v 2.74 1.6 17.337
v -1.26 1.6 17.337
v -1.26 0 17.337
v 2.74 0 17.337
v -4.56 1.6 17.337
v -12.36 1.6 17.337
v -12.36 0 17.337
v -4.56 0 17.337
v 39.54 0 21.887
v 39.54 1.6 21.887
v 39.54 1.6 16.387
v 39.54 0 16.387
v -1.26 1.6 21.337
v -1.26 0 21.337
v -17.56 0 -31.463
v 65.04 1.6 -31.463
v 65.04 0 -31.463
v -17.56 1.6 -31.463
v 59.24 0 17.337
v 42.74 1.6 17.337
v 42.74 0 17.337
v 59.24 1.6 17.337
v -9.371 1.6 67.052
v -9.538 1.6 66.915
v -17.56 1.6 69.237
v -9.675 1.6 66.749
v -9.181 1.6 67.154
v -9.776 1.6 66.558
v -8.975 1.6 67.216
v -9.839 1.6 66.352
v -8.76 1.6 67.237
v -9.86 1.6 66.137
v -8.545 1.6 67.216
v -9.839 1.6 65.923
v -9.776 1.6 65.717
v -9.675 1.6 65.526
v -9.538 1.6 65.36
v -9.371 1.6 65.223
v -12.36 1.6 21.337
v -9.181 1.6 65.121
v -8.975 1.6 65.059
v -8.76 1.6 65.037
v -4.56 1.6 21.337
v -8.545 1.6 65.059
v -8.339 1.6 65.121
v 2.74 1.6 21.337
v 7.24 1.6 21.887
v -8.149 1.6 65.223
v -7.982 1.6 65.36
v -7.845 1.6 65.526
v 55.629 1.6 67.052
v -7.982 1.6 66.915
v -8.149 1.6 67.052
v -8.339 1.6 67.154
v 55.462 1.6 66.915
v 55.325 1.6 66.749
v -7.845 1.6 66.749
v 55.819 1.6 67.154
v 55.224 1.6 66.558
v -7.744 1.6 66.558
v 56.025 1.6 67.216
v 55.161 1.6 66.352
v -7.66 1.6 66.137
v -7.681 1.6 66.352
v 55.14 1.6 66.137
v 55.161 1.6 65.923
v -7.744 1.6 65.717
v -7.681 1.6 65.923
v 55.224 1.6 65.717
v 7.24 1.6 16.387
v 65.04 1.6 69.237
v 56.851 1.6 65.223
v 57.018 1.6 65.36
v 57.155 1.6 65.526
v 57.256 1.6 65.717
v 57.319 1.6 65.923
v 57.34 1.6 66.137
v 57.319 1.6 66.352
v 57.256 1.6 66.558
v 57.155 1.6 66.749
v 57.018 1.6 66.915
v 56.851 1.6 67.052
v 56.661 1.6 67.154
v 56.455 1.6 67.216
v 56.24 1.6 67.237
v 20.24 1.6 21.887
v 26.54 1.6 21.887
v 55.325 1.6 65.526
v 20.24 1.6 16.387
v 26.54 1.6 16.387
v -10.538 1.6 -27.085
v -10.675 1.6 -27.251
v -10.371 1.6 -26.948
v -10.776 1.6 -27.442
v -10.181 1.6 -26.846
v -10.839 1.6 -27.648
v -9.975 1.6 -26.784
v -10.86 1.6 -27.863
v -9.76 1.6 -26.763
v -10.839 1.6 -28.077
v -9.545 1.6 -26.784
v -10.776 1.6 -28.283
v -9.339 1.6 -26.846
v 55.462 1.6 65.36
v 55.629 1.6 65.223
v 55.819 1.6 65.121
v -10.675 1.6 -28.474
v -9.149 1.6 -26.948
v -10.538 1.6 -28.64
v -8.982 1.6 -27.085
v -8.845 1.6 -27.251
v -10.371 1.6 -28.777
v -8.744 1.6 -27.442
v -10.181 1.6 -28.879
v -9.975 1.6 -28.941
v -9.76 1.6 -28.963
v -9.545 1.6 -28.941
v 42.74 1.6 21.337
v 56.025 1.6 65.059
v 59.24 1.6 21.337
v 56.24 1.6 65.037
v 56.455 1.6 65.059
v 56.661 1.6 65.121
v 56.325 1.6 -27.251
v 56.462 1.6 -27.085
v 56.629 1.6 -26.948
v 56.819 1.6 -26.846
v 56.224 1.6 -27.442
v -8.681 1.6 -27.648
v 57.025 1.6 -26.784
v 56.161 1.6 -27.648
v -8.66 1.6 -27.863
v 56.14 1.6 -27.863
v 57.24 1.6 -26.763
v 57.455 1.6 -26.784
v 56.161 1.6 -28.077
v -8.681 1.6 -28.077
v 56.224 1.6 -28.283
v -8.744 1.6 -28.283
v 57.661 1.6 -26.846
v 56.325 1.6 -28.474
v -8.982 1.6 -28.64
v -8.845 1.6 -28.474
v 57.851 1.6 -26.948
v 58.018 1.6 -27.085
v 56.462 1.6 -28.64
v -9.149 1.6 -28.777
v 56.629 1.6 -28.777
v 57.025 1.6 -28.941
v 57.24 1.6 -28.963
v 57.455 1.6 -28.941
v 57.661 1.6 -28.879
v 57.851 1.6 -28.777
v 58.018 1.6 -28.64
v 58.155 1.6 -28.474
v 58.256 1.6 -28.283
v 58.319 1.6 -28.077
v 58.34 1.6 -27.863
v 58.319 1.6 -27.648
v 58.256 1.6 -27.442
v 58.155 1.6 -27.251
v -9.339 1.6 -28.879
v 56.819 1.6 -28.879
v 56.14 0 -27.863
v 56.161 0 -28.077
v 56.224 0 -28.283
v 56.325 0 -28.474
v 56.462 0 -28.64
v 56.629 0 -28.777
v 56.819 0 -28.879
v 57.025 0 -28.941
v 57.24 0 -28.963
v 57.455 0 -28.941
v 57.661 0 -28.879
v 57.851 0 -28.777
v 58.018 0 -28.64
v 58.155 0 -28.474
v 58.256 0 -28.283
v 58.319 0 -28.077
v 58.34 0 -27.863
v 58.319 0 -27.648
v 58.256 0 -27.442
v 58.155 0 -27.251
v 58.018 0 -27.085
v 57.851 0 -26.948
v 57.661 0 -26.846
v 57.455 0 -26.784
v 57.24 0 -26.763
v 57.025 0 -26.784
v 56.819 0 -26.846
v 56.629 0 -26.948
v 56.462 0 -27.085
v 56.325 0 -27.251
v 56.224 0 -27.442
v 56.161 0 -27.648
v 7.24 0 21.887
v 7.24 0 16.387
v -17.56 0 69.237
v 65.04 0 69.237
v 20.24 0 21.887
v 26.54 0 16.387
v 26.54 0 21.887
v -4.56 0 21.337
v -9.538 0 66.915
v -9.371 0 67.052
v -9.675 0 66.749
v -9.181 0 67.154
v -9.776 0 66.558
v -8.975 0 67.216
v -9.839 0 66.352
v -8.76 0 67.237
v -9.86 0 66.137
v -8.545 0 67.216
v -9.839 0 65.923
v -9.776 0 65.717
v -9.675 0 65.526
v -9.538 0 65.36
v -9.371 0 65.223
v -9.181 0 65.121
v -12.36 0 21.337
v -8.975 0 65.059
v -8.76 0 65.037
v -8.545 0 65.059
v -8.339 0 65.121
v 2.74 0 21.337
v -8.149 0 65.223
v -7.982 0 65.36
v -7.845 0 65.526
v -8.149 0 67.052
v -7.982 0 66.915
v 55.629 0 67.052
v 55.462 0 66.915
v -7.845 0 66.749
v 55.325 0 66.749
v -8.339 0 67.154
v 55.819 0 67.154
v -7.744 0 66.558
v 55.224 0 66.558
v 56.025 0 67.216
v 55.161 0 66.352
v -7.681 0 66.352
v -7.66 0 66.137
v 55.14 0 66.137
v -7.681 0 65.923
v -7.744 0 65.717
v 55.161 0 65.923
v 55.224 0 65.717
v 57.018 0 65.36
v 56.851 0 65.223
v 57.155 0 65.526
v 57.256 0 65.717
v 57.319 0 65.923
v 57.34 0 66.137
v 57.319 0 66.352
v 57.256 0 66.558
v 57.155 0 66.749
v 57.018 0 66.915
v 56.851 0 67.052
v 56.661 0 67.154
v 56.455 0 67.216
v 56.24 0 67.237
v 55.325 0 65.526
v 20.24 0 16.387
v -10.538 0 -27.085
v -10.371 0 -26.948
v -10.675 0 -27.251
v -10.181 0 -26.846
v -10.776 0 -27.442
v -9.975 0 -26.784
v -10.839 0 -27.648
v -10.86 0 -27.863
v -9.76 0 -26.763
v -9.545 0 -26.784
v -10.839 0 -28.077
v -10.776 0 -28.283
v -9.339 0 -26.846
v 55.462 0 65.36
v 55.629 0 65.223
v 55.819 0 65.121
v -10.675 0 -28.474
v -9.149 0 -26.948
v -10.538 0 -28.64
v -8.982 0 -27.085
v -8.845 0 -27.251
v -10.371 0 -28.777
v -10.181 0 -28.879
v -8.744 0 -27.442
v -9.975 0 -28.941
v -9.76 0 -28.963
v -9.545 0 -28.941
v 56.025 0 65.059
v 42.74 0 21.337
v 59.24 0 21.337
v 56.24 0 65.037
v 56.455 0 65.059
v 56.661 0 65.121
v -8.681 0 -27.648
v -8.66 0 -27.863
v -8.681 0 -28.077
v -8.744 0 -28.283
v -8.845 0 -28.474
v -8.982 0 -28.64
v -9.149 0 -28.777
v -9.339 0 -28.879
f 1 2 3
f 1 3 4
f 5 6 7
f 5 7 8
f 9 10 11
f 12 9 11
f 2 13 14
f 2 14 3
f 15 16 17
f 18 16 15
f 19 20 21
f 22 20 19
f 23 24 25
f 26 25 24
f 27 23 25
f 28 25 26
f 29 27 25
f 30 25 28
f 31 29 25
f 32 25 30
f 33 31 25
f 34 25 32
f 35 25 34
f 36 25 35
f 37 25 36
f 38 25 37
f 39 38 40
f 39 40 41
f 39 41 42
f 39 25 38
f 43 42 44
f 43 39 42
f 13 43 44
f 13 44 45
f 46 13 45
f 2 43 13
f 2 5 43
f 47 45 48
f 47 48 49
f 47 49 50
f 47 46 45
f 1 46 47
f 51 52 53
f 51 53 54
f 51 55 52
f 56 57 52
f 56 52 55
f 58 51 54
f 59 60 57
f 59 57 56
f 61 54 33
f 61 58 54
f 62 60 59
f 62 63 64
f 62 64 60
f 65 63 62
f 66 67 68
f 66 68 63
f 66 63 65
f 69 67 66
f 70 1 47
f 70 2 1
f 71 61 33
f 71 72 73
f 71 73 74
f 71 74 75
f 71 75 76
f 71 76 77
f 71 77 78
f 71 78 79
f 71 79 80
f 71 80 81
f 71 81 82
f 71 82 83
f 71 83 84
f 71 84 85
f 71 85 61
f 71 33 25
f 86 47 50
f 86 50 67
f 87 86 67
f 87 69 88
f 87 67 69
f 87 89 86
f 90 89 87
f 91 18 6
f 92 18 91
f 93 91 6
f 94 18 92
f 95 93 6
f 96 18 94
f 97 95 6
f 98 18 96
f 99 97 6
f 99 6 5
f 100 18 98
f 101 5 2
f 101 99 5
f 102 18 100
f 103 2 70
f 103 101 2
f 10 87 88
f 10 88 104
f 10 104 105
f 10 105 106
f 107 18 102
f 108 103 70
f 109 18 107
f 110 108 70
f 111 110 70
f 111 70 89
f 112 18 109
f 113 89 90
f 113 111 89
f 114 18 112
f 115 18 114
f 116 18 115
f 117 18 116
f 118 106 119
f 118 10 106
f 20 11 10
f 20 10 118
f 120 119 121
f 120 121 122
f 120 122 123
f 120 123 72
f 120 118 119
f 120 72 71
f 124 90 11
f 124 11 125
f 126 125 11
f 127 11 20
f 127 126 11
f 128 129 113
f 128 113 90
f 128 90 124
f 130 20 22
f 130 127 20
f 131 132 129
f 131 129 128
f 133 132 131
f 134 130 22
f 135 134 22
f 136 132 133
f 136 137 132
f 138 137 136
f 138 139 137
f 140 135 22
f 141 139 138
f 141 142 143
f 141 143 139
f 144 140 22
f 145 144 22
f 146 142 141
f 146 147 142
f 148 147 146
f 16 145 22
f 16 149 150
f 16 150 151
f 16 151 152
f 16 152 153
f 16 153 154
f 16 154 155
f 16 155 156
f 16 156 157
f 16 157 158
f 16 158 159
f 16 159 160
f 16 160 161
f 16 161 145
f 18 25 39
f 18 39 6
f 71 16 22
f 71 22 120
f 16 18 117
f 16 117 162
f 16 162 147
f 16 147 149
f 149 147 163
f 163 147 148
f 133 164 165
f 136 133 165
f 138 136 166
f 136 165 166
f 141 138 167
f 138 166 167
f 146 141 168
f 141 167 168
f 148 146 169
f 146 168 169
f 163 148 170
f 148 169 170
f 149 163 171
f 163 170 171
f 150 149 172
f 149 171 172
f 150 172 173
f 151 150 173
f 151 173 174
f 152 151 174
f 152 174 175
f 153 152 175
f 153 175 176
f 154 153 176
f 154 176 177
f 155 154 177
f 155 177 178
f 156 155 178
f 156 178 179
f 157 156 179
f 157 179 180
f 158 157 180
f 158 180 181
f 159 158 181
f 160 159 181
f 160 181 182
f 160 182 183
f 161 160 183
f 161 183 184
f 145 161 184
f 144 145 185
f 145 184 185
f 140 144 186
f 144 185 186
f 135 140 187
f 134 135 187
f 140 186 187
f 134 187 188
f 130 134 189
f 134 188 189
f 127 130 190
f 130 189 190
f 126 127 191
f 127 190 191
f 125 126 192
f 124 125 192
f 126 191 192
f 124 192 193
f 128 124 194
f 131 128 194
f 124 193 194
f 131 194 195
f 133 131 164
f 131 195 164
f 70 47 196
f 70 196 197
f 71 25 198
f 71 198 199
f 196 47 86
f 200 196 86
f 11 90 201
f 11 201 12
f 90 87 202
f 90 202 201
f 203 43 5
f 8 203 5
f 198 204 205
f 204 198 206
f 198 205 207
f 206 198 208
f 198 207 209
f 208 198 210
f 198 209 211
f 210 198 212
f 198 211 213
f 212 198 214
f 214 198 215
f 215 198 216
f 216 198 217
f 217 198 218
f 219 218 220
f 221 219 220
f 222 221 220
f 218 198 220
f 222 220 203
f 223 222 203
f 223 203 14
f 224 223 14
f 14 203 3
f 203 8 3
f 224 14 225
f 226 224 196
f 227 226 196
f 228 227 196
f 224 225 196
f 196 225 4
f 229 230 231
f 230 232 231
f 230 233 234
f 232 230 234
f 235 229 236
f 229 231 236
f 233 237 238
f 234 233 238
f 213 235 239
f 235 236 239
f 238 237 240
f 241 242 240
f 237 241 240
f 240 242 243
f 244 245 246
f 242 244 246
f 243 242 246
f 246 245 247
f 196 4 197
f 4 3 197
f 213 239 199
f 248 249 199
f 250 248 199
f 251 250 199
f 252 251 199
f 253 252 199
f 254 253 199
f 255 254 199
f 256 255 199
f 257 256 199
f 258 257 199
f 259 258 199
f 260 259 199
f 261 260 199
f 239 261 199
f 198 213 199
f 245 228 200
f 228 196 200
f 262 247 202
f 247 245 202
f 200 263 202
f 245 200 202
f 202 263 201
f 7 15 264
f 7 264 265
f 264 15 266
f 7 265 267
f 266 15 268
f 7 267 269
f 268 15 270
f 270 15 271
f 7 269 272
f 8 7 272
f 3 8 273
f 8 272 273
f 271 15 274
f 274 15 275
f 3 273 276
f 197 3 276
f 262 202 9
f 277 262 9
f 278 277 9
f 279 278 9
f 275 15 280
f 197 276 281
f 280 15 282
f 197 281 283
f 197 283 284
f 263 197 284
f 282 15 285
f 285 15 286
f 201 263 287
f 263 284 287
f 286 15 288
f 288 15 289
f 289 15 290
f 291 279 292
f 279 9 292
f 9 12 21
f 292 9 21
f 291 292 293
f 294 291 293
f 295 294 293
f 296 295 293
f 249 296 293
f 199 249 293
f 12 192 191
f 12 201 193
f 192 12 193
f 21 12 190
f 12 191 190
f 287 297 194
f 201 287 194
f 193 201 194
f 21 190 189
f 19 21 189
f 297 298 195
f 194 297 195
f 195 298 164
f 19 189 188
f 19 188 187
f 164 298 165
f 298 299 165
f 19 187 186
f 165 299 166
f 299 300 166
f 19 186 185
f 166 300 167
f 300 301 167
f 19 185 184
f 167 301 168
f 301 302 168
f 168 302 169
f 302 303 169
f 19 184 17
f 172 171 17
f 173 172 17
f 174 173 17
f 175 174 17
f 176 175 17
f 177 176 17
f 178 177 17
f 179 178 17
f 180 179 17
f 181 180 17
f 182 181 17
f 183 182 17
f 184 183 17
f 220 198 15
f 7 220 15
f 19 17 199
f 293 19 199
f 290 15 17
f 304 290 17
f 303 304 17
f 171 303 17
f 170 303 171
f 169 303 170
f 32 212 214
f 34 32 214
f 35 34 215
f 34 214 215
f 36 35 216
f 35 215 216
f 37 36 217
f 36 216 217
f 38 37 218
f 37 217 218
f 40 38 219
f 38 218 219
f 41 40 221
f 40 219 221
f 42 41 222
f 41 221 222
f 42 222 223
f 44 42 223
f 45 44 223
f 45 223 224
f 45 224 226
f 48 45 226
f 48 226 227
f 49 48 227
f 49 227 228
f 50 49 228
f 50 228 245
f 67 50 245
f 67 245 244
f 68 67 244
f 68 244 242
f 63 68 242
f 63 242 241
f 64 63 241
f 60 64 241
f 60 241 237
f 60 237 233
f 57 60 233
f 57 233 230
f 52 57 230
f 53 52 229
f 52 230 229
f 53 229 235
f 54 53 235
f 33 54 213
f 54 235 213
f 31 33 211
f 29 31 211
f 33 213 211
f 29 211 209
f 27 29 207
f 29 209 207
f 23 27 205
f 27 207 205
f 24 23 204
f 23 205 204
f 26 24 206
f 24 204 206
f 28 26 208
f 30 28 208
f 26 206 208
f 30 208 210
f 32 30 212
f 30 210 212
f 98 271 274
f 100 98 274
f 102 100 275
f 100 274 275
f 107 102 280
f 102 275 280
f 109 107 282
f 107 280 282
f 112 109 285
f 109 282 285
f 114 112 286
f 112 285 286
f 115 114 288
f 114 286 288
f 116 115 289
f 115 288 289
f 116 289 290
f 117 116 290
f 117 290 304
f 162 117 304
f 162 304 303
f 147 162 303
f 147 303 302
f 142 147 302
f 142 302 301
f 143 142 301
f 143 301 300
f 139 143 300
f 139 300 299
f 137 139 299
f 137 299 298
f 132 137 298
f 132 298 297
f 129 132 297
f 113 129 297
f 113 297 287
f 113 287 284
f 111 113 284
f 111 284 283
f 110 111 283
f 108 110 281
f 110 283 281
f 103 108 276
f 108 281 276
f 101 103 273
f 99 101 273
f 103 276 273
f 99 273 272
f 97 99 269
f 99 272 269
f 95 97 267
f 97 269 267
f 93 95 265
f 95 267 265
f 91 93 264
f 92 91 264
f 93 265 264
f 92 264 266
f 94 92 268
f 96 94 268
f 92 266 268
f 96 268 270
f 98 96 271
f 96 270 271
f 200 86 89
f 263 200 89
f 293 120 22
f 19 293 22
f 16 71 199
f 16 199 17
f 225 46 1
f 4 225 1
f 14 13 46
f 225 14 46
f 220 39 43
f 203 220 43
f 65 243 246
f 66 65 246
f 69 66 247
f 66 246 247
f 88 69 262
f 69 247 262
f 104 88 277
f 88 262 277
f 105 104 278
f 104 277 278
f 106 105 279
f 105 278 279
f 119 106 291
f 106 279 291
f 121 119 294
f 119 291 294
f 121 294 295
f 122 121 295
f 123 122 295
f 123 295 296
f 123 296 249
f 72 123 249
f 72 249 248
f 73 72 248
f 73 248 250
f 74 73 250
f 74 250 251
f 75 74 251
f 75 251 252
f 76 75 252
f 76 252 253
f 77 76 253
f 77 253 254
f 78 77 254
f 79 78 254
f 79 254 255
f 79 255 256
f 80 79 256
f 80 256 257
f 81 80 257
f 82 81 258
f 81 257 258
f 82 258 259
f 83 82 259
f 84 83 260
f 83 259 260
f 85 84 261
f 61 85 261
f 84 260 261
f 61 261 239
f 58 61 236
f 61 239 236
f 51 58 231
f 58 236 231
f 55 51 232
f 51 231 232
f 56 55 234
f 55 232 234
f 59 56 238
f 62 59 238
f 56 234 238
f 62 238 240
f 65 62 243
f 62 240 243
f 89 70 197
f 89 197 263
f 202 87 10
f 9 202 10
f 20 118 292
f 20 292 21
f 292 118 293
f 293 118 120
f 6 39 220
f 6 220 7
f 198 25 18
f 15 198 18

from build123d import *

# Parameters (mm, degrees)
BOSS_EXTRUDE1_DEPTH            = 1.6
SKETCH3_W                      = 13
SKETCH3_H                      = 5.5
SKETCH3_W_2                    = 16.5
SKETCH3_H_2                    = 4
SKETCH3_W_3                    = 7.8
SKETCH3_W_4                    = 4
CUT_EXTRUDE2_DEPTH             = 49
F_2_2_2_2_DIAMETER_HOLE2_D     = 2.2
F_2_2_2_2_DIAMETER_HOLE2_DEPTH = 5
CUT_EXTRUDE4_REACH             = 3.6
SKETCH12_W                     = 83
SKETCH12_H                     = 2.5
SKETCH_1_W                     = 83
SKETCH_1_H                     = 1.6
EXTRUDE_1_DEPTH                = 1.6
SKETCH_2_W                     = 83
SKETCH_2_H                     = 1.6
EXTRUDE_2_DEPTH                = 1.6
F_2_2_2_2_DIAMETER_HOLE1_D     = 2.2
F_2_2_2_2_DIAMETER_HOLE1_DEPTH = 1.6
SKETCH16_W                     = 0.2
SKETCH16_H                     = 100.7
EXTRUDE1_DEPTH                 = 2.6


with BuildPart() as part:
    # Sketch1 → Boss-Extrude1 (new body)
    with BuildSketch(Plane(origin=(0, 0, 0), x_dir=(1, 0, 0), z_dir=(0, 1, 0))):
        Polygon((65.24, 0.272495156), (65.24, -46.437452638), (65.24, -63.637452638), (65.24, -70.137452638), (-17.76, -70.137452638), (-17.76, -63.637452638), (-17.76, -48.637452638), (-17.76, -45.78978272), (-17.76, 4.362547362), (-17.76, 21.562547362), (-17.76, 29.862547362), (65.24, 29.862547362), (65.24, 21.562547362), (65.24, 6.562547362), align=None)
    extrude(amount=BOSS_EXTRUDE1_DEPTH)

    # Sketch3 → Cut-Extrude2 (cut)
    with BuildSketch(Plane(origin=(0, 1.6, 0), x_dir=(1, 0, 0), z_dir=(0, 1, 0))):
        with Locations((13.74, -19.137452638)):
            Rectangle(SKETCH3_W, SKETCH3_H)
        with Locations((50.99, -19.337452638)):
            Rectangle(SKETCH3_W_2, SKETCH3_H_2)
        with Locations((-8.46, -19.337452638)):
            Rectangle(SKETCH3_W_3, SKETCH3_H_2)
        with Locations((33.04, -19.137452638)):
            Rectangle(SKETCH3_W, SKETCH3_H)
        with Locations((0.74, -19.337452638)):
            Rectangle(SKETCH3_W_4, SKETCH3_H_2)
    extrude(amount=-CUT_EXTRUDE2_DEPTH, mode=Mode.SUBTRACT)

    # Ø2.2 (2.2) Diameter Hole2
    with Locations(Plane(origin=(0, 1.6, 0), x_dir=(1, 0, 0), z_dir=(0, 1, 0))):
        with Locations((56.24, -66.137452638), (-8.76, -66.137452638)):
            Hole(F_2_2_2_2_DIAMETER_HOLE2_D / 2, depth=F_2_2_2_2_DIAMETER_HOLE2_DEPTH)

    # Sketch12 → Cut-Extrude4 (cut, up to next)
    with BuildSketch(Plane(origin=(0, 1.6, 0), x_dir=(1, 0, 0), z_dir=(0, 1, 0)), mode=Mode.PRIVATE) as cut_extrude4_sk1:
        with Locations((23.74, -68.887452638)):
            Rectangle(SKETCH12_W, SKETCH12_H)
    cut_extrude4_tool1 = extrude(cut_extrude4_sk1.sketch, amount=-CUT_EXTRUDE4_REACH, mode=Mode.PRIVATE) & part.part
    add(cut_extrude4_tool1.solids().sort_by_distance((23.74, 1.6, 68.887453))[0], mode=Mode.SUBTRACT)

    # ｽｹｯﾁ1 → ﾎﾞｽ - 押し出し1 (add)
    with BuildSketch(Plane(origin=(0, 0, -29.862547362), x_dir=(-1, 0, 0), z_dir=(0, 0, -1))):
        with Locations((-23.74, 0.8)):
            Rectangle(SKETCH_1_W, SKETCH_1_H)
    extrude(amount=EXTRUDE_1_DEPTH)

    # ｽｹｯﾁ2 → ﾎﾞｽ - 押し出し2 (add)
    with BuildSketch(Plane.XY.offset(67.637452638)):
        with Locations((23.74, 0.8)):
            Rectangle(SKETCH_2_W, SKETCH_2_H)
    extrude(amount=EXTRUDE_2_DEPTH)

    # Ø2.2 (2.2) Diameter Hole1
    with Locations(Plane(origin=(0, 1.6, 0), x_dir=(1, 0, 0), z_dir=(0, 1, 0))):
        with Locations((-9.76, 27.862547362), (57.24, 27.862547362)):
            Hole(F_2_2_2_2_DIAMETER_HOLE1_D / 2, depth=F_2_2_2_2_DIAMETER_HOLE1_DEPTH)

    # Sketch16 → Extrude1 (cut, through all)
    with BuildSketch(Plane(origin=(0, 1.6, 0), x_dir=(1, 0, 0), z_dir=(0, 1, 0))):
        with Locations((-17.66, -18.887452638)):
            Rectangle(SKETCH16_W, SKETCH16_H)
        with Locations((65.14, -18.887452638)):
            Rectangle(SKETCH16_W, SKETCH16_H)
    extrude(amount=-EXTRUDE1_DEPTH, mode=Mode.SUBTRACT)


solid = part.part
